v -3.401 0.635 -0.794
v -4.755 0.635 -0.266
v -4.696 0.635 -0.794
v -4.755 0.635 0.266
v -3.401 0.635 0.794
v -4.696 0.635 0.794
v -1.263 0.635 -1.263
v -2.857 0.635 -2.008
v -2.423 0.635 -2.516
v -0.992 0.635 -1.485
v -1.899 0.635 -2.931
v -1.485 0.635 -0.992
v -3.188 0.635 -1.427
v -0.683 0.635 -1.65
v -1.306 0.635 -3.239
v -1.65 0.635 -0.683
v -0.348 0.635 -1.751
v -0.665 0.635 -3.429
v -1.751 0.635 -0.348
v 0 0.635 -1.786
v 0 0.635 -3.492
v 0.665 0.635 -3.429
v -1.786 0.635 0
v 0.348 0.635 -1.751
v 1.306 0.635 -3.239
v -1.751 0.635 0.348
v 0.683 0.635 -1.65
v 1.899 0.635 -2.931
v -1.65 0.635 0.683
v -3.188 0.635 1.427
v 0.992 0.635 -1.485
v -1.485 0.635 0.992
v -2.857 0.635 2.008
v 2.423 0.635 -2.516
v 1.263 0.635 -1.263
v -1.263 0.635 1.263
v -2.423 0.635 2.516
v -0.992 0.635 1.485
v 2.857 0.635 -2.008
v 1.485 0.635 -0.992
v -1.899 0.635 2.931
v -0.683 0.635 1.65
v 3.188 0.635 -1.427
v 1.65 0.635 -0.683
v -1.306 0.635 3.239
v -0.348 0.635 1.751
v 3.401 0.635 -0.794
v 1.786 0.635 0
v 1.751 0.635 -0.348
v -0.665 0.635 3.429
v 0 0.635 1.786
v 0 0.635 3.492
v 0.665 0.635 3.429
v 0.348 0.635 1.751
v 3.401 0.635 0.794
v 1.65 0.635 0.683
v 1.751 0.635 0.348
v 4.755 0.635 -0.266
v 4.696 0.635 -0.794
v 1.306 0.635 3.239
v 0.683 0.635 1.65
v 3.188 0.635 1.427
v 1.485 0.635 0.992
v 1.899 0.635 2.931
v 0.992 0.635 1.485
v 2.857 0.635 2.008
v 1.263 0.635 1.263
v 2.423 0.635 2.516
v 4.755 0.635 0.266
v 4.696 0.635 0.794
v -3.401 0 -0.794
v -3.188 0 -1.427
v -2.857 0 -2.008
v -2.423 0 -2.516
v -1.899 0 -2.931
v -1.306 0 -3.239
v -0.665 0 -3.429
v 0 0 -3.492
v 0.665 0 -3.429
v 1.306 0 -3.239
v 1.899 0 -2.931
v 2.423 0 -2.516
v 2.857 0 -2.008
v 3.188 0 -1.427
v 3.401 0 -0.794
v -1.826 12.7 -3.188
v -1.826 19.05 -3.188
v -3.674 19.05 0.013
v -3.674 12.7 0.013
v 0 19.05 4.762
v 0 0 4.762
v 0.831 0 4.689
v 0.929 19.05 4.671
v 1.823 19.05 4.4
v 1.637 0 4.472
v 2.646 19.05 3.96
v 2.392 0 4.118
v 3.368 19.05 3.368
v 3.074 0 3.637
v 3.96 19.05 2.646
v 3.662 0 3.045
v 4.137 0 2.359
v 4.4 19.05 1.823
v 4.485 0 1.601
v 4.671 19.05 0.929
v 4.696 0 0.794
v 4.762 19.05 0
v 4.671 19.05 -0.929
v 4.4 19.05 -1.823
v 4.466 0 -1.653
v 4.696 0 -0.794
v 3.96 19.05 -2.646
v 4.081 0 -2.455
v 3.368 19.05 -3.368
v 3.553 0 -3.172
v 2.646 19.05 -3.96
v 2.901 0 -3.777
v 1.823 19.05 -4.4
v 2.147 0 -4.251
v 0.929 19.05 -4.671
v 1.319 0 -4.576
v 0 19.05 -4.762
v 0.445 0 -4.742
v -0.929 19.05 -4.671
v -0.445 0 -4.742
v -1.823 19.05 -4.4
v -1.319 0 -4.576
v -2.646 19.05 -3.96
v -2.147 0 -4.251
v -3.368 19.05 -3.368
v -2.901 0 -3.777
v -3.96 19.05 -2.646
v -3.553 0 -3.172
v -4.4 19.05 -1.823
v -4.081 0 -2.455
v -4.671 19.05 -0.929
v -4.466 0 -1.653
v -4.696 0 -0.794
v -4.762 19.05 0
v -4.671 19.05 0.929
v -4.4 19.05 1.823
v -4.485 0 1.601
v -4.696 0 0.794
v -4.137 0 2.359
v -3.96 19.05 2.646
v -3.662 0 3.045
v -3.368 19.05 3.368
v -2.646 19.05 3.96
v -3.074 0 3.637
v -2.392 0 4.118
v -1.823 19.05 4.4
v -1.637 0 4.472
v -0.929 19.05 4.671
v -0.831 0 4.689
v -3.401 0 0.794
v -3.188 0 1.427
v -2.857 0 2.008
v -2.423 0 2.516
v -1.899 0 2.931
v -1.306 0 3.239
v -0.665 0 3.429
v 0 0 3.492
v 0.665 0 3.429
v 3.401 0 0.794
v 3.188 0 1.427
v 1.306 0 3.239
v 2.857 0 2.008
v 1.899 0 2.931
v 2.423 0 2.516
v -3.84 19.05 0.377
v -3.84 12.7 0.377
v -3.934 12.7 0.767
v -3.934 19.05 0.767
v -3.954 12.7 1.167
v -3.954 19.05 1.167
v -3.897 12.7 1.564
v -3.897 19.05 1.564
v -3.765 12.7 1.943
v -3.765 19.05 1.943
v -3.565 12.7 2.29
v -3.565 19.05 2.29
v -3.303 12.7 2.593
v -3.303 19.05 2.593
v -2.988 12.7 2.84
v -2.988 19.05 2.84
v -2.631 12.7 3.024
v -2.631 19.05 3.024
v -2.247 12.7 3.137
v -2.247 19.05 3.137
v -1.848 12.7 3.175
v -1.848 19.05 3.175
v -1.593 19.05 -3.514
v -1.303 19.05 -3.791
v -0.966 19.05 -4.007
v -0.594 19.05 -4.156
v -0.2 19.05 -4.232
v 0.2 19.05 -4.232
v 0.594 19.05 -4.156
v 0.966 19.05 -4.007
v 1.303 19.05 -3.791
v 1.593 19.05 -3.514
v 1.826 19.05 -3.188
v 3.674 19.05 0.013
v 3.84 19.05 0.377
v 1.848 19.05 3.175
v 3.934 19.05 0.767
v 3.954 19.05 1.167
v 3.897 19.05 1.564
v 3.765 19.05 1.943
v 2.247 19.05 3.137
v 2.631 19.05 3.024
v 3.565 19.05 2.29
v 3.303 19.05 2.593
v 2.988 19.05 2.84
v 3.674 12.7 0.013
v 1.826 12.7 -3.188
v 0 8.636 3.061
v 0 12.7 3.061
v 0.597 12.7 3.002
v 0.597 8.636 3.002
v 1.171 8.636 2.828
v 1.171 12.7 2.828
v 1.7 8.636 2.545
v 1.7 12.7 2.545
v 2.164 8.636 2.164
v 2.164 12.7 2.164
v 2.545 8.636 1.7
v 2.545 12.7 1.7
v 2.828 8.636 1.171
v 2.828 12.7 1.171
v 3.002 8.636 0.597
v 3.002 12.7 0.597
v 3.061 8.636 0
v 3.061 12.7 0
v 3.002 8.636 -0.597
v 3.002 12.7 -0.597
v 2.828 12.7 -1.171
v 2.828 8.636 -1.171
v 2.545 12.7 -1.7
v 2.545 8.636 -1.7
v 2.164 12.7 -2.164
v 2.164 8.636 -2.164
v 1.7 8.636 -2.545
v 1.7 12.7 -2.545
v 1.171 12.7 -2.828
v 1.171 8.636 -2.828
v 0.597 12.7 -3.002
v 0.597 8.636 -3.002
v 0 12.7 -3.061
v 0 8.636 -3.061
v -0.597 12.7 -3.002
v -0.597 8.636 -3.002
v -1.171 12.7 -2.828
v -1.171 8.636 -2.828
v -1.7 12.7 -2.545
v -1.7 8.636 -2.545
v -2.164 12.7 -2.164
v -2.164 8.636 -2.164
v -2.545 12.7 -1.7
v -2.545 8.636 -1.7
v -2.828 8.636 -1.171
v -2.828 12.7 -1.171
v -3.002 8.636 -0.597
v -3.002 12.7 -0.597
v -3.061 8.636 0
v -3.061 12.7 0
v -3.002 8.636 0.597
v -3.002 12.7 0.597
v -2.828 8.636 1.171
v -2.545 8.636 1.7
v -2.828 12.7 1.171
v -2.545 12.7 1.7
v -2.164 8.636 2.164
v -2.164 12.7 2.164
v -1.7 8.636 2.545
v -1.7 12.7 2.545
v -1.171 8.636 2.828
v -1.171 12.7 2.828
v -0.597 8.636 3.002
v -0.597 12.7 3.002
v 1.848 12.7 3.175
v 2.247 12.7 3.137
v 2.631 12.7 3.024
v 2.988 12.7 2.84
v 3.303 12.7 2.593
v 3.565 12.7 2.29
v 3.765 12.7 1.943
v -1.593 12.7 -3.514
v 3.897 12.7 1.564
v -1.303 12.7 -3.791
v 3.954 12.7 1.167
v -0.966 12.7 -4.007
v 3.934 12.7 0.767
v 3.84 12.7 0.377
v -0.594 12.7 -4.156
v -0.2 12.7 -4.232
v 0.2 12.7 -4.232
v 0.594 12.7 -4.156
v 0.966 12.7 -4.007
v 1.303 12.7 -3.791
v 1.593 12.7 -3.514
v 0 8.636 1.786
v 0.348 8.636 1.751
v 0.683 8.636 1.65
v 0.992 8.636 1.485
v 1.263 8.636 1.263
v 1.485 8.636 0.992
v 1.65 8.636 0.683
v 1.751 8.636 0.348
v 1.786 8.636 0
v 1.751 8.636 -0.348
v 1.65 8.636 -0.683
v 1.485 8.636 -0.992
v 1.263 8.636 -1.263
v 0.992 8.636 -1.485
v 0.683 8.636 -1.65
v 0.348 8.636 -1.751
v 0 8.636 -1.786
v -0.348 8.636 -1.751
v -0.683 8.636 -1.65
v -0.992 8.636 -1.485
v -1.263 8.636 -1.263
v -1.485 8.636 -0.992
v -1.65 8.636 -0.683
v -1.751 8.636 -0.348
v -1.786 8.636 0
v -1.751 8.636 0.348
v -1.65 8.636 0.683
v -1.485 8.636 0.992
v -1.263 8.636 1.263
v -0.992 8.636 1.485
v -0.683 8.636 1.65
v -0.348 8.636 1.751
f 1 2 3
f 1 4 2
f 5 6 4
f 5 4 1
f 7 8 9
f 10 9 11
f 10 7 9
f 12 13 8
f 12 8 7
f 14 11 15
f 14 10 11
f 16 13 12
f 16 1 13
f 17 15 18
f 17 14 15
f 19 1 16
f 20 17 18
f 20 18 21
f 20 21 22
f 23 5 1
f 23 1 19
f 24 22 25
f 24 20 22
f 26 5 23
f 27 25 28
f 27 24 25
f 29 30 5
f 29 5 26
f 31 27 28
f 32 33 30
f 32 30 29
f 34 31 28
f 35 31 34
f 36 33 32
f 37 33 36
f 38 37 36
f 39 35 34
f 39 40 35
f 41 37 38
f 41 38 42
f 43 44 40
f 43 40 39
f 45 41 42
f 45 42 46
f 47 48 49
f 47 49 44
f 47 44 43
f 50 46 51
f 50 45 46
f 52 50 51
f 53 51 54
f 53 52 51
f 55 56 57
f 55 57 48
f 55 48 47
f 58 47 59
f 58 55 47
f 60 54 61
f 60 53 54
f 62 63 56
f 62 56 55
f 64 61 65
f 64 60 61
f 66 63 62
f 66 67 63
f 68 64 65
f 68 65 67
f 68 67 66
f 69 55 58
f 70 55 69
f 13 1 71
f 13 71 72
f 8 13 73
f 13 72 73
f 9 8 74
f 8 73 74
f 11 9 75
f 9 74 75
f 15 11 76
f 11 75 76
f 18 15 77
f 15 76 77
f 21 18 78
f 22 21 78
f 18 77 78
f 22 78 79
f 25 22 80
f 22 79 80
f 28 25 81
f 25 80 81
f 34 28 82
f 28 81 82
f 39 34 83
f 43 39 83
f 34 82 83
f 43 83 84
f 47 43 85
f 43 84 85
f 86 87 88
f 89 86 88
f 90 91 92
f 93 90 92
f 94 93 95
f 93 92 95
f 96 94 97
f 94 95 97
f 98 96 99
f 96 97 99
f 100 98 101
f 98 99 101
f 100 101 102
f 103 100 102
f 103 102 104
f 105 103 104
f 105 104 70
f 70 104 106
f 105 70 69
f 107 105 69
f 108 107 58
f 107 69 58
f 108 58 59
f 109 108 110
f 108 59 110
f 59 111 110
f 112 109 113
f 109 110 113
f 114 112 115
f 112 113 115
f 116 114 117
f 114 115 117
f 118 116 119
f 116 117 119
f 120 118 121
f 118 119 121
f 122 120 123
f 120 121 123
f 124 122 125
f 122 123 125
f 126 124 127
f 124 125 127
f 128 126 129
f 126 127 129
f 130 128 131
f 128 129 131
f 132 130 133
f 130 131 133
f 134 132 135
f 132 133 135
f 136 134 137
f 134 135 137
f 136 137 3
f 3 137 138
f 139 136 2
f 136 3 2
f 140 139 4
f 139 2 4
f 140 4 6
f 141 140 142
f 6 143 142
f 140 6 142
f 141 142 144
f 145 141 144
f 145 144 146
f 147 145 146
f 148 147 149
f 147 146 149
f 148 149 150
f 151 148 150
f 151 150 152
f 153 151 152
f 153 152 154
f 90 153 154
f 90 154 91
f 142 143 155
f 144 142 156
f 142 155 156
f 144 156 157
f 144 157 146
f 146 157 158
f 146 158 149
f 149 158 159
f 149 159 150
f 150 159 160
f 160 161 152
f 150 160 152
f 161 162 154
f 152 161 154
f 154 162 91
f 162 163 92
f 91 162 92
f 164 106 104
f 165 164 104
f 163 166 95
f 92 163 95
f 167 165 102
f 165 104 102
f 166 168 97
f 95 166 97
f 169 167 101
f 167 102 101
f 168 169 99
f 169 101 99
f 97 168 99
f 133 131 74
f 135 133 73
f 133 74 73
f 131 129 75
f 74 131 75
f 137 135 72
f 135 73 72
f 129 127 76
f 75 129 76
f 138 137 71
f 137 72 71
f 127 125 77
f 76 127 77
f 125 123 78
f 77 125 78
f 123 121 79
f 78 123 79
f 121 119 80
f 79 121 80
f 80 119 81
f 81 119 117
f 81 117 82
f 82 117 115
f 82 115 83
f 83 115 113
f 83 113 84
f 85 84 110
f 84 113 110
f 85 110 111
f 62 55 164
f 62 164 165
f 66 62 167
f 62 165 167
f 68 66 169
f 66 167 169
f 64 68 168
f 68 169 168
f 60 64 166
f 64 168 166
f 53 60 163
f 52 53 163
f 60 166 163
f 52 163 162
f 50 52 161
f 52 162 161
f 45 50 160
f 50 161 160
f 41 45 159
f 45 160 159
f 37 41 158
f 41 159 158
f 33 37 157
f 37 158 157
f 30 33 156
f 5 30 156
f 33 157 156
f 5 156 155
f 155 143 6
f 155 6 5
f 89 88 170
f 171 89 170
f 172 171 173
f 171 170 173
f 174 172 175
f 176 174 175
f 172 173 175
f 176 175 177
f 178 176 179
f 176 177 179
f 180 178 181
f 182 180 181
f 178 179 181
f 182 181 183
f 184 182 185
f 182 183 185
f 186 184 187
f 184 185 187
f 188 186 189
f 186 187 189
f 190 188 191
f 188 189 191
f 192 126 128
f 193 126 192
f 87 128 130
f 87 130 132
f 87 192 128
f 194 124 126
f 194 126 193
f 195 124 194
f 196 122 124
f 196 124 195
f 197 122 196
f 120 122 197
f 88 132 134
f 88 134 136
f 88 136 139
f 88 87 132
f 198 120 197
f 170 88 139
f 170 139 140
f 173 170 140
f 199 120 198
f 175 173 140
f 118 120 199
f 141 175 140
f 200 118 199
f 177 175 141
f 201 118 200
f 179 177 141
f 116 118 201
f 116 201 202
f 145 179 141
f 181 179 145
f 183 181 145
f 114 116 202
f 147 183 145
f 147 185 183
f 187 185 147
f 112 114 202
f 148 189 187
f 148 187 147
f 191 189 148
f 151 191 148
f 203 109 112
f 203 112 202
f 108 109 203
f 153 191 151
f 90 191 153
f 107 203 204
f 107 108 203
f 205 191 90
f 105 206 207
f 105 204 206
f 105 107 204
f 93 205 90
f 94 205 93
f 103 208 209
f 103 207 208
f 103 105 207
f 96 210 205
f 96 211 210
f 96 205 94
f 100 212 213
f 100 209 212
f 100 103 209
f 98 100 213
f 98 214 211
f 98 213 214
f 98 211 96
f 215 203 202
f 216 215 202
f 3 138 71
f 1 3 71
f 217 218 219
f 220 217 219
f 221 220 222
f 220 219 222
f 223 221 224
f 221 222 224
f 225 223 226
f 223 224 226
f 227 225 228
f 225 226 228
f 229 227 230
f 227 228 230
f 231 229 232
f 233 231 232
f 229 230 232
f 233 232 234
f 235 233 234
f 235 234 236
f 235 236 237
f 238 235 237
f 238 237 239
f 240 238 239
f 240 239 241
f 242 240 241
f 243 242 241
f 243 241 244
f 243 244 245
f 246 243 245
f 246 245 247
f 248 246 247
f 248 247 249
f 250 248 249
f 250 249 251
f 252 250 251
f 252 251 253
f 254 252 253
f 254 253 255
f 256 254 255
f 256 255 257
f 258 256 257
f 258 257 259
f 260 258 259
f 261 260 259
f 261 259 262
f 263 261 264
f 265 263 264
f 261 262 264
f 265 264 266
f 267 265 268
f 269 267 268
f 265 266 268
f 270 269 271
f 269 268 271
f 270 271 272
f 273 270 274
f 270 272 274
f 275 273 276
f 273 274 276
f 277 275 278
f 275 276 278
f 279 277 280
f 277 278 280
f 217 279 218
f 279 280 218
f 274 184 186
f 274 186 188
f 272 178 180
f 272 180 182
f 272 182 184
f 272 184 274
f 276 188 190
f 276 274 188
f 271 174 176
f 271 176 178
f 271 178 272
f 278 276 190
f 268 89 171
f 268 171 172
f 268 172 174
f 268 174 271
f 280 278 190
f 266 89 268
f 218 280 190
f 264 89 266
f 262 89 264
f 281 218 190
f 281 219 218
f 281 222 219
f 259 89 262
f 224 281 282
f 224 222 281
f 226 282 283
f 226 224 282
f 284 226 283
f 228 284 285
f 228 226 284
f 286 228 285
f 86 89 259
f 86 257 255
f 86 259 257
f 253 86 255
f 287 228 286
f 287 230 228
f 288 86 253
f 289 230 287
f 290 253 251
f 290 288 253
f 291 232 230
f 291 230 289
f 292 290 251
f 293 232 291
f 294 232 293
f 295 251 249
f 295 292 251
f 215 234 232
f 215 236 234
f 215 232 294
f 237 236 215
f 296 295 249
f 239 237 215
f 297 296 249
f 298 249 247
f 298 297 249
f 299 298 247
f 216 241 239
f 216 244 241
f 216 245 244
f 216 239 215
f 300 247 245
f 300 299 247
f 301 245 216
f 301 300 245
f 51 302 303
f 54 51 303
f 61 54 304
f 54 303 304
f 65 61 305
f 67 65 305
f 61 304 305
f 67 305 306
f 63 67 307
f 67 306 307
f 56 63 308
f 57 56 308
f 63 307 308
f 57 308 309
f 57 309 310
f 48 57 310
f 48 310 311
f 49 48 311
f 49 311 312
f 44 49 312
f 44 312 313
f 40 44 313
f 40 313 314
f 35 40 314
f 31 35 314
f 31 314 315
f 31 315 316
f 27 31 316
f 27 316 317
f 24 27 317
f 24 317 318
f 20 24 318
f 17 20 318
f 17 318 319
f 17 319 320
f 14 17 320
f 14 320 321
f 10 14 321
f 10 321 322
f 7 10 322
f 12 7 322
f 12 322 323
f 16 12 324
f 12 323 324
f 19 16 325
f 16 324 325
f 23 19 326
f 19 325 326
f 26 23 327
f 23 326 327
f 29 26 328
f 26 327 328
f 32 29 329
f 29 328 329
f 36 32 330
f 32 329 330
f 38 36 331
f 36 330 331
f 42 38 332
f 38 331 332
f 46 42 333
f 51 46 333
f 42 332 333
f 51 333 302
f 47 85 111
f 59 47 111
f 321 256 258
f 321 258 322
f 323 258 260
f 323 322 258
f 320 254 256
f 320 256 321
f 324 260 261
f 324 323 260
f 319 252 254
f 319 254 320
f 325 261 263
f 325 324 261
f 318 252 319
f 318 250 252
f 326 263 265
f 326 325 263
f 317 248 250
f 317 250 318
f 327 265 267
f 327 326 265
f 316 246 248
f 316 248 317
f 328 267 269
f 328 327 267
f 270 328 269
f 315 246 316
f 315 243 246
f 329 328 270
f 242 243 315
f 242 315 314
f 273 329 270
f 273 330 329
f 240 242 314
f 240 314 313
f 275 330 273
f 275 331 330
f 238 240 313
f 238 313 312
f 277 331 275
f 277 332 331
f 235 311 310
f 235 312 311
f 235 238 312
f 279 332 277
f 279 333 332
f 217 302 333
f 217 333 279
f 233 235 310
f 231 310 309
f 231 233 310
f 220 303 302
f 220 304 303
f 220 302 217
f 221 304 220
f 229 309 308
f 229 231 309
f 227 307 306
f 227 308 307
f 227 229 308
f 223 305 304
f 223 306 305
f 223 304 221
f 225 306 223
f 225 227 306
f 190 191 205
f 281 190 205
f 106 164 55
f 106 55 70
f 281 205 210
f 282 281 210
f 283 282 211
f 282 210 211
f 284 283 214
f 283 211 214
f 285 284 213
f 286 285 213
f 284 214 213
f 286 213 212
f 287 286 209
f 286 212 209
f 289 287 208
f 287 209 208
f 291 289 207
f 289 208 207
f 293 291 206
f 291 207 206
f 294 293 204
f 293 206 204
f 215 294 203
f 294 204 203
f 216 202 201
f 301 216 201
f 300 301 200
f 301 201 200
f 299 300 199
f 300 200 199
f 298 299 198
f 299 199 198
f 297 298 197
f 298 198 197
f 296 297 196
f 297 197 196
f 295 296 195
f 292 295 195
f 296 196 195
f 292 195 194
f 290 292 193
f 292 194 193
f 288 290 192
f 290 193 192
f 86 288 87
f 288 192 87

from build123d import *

# Parameters (mm, degrees)
SKETCH1_R                       = 4.7625
EXTRUDE1_DEPTH                  = 19.05
SKETCH2_R                       = 3.0607
CUT_EXTRUDE1_DEPTH              = 10.414
SKETCH3_R                       = 3.4925
CUT_EXTRUDE2_DEPTH              = 0.635
CUT_EXTRUDE5_DEPTH              = 6.35
F_9_64_0_14063_DIAMETER_HOLE1_D = 3.57124
SKETCH7_W                       = 9.525
SKETCH7_H                       = 1.5875
CUT_EXTRUDE4_DEPTH              = 0.635


with BuildPart() as part:
    # Sketch1 → Extrude1 (new body)
    with BuildSketch(Plane(origin=(0, 0, 0), x_dir=(1, 0, 0), z_dir=(0, 1, 0))):
        with Locations(Location((0, 0, 0), (0, 0, 270))):  # turned: the seam where the file's is
            Circle(SKETCH1_R)
    extrude(amount=EXTRUDE1_DEPTH)

    # Sketch2 → Cut-Extrude1 (cut)
    with BuildSketch(Plane(origin=(0, 19.05, 0), x_dir=(1, 0, 0), z_dir=(0, 1, 0))):
        with Locations(Location((0, 0, 0), (0, 0, 270))):  # turned: the seam where the file's is
            Circle(SKETCH2_R)
    extrude(amount=-CUT_EXTRUDE1_DEPTH, mode=Mode.SUBTRACT)

    # Sketch3 → Cut-Extrude2 (cut)
    with BuildSketch(Plane.XZ):
        with Locations(Location((0, 0, 0), (0, 0, 270))):  # turned: the seam where the file's is
            Circle(SKETCH3_R)
    extrude(amount=-CUT_EXTRUDE2_DEPTH, mode=Mode.SUBTRACT)

    # Sketch8 → Cut-Extrude5 (cut)
    with BuildSketch(Plane(origin=(0, 19.05, 0), x_dir=(1, 0, 0), z_dir=(0, 1, 0))):
        with BuildLine():
            Line((-1.825754756, 3.1877), (-3.673506558, -0.0127))
            ThreePointArc((-3.673506558, -0.0127), (-3.673506558, -2.1209), (-1.847751802, -3.175))
            Line((-1.847751802, -3.175), (1.847751802, -3.175))
            ThreePointArc((1.847751802, -3.175), (3.673506558, -2.1209), (3.673506558, -0.0127))
            Line((3.673506558, -0.0127), (1.825754756, 3.1877))
            ThreePointArc((1.825754756, 3.1877), (0, 4.2418), (-1.825754756, 3.1877))
        make_face()
    extrude(amount=-CUT_EXTRUDE5_DEPTH, mode=Mode.SUBTRACT)

    # 9/64 (0.14063) Diameter Hole1 (through all)
    with Locations(Plane(origin=(0, 0.635, 0), x_dir=(0, 0, -1), z_dir=(0, -1, 0))):
        with Locations((0, 0)):
            Hole(F_9_64_0_14063_DIAMETER_HOLE1_D / 2)

    # Sketch7 → Cut-Extrude4 (cut)
    with BuildSketch(Plane.XZ):
        Rectangle(SKETCH7_W, SKETCH7_H)
    extrude(amount=-CUT_EXTRUDE4_DEPTH, mode=Mode.SUBTRACT)


solid = part.part
